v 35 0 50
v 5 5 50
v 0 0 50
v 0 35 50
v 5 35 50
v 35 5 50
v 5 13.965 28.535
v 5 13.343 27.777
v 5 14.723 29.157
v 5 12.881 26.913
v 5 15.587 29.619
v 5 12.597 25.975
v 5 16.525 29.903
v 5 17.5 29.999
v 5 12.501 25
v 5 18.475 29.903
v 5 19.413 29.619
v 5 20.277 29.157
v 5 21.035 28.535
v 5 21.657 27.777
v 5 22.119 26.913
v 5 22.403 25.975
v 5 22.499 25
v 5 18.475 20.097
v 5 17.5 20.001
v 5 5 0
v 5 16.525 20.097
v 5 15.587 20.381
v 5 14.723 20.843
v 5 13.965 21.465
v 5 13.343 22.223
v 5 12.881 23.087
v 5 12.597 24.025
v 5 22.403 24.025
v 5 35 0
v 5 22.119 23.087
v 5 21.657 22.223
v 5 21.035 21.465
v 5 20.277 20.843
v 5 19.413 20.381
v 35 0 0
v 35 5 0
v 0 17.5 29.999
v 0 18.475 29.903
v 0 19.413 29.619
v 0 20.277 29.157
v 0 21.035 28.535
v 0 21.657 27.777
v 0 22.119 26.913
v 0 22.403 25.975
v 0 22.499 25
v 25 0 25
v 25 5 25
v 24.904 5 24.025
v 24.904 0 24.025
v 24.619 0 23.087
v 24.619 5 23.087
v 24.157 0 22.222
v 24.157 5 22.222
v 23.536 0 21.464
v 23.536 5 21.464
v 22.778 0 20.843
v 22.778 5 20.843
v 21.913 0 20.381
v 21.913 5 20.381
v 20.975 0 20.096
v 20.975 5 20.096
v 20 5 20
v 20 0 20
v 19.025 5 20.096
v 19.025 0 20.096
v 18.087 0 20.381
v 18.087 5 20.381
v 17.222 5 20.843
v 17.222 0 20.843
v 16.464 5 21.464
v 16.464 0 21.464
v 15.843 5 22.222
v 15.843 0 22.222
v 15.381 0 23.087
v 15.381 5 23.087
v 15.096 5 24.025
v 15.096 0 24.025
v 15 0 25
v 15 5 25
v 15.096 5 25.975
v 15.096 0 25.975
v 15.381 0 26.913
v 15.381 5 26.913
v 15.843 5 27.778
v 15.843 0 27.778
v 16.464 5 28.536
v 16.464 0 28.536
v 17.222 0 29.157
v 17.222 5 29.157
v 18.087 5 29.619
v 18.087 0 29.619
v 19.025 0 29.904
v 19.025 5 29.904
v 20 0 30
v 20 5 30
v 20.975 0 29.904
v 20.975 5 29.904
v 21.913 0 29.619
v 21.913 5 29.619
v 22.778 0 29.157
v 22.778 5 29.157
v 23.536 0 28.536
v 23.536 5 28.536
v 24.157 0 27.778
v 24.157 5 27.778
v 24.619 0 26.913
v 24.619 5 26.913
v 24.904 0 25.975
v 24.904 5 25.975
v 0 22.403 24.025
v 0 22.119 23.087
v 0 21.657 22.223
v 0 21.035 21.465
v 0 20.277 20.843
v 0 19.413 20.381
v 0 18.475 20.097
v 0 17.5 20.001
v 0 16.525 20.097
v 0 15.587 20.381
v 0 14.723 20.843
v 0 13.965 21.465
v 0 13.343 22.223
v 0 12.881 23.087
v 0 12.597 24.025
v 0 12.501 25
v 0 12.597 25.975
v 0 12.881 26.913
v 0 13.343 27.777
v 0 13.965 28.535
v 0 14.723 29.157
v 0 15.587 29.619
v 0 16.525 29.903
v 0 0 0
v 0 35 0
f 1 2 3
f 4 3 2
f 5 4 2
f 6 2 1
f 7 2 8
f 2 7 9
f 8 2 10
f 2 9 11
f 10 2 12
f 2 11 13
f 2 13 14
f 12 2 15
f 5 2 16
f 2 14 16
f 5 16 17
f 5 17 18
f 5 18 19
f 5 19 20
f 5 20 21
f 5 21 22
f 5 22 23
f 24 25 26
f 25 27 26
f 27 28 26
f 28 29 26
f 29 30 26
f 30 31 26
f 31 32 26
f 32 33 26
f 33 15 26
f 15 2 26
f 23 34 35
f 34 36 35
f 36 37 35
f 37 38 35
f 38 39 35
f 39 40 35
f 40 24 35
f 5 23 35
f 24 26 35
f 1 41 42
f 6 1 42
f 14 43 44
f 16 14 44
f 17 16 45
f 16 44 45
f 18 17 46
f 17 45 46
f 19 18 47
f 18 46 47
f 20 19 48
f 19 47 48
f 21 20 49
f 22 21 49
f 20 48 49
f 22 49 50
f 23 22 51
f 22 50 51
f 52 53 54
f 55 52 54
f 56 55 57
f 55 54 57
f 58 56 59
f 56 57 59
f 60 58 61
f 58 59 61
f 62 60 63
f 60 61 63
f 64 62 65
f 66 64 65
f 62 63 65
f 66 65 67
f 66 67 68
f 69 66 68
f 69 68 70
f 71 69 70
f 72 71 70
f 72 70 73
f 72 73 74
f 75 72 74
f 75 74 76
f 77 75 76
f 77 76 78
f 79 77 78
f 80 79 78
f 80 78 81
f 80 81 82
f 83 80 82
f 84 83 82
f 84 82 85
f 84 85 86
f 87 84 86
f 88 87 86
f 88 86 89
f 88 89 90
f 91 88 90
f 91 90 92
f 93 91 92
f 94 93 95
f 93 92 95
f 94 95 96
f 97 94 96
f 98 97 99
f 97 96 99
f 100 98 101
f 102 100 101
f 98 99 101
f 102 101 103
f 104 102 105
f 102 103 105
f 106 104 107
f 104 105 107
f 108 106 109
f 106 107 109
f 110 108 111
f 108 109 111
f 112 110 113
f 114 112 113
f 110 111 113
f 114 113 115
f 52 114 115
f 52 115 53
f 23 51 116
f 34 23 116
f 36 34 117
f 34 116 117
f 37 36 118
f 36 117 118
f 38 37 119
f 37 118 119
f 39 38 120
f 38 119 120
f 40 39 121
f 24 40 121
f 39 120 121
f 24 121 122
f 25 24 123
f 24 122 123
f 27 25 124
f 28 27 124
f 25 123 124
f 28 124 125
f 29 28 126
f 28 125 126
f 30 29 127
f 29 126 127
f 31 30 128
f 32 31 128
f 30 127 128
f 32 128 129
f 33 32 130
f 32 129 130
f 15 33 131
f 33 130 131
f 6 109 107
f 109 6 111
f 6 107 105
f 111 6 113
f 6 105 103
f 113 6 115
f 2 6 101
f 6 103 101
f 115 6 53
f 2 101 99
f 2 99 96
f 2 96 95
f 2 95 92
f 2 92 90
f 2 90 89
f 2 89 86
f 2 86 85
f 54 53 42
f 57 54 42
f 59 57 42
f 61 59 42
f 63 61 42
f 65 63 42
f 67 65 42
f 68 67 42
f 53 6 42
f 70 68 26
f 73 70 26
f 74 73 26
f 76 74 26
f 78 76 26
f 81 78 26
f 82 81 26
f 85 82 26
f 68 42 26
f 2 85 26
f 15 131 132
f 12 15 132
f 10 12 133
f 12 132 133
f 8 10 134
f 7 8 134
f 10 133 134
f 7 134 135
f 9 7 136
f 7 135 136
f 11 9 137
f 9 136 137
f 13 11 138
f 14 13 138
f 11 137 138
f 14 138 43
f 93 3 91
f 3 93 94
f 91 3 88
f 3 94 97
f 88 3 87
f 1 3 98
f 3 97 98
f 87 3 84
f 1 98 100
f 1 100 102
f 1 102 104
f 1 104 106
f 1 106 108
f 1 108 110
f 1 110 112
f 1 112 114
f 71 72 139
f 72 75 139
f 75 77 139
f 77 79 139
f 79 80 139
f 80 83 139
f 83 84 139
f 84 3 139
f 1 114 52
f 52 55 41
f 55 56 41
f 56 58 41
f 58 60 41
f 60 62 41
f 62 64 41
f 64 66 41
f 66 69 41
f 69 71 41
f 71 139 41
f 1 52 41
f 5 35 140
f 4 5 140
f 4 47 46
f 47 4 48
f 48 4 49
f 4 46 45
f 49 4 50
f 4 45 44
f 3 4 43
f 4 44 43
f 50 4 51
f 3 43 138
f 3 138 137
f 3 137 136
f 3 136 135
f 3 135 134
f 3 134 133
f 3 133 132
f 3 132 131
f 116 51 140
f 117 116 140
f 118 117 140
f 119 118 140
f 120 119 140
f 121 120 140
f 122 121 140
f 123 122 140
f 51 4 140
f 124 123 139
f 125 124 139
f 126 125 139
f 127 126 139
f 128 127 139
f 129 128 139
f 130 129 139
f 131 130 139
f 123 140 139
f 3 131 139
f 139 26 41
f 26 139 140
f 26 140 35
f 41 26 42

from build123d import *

# Parameters (mm, degrees)
BOSS_EXTRUDE1_DEPTH = 50
CUT_EXTRUDE1_DEPTH  = 71.356236397
CUT_EXTRUDE2_DEPTH  = 50


with BuildPart() as part:
    # Sketch1 → Boss-Extrude1 (new body)
    with BuildSketch(Plane.XY):
        Polygon((0, 0), (35, 0), (35, 5), (5, 5), (5, 35), (0, 35), align=None)
    extrude(amount=BOSS_EXTRUDE1_DEPTH)

    # Sketch3 → Cut-Extrude1 (cut, through all)
    with BuildSketch(Plane.ZY):
        with BuildLine():
            ThreePointArc((29.999165768, 17.5), (28.534944015, 21.034944015), (25, 22.499165768))
            Line((25, 22.499165768), (25, 12.500834232))
            ThreePointArc((25, 12.500834232), (28.534944015, 13.965055985), (29.999165768, 17.5))
        make_face()
        with BuildLine():
            Line((25, 12.500834232), (25, 22.499165768))
            ThreePointArc((25, 22.499165768), (20.000834232, 17.5), (25, 12.500834232))
        make_face()
    extrude(amount=-CUT_EXTRUDE1_DEPTH, mode=Mode.SUBTRACT)

    # Sketch2 → Cut-Extrude2 (cut)
    with BuildSketch(Plane(origin=(0, 5, 0), x_dir=(1, 0, 0), z_dir=(0, 1, 0))):
        with BuildLine():
            ThreePointArc((15, -25), (20, -30), (25, -25))
            Line((25, -25), (15, -25))
        make_face()
        with BuildLine():
            Line((15, -25), (25, -25))
            ThreePointArc((25, -25), (20, -20), (15, -25))
        make_face()
    extrude(amount=-CUT_EXTRUDE2_DEPTH, mode=Mode.SUBTRACT)


solid = part.part
